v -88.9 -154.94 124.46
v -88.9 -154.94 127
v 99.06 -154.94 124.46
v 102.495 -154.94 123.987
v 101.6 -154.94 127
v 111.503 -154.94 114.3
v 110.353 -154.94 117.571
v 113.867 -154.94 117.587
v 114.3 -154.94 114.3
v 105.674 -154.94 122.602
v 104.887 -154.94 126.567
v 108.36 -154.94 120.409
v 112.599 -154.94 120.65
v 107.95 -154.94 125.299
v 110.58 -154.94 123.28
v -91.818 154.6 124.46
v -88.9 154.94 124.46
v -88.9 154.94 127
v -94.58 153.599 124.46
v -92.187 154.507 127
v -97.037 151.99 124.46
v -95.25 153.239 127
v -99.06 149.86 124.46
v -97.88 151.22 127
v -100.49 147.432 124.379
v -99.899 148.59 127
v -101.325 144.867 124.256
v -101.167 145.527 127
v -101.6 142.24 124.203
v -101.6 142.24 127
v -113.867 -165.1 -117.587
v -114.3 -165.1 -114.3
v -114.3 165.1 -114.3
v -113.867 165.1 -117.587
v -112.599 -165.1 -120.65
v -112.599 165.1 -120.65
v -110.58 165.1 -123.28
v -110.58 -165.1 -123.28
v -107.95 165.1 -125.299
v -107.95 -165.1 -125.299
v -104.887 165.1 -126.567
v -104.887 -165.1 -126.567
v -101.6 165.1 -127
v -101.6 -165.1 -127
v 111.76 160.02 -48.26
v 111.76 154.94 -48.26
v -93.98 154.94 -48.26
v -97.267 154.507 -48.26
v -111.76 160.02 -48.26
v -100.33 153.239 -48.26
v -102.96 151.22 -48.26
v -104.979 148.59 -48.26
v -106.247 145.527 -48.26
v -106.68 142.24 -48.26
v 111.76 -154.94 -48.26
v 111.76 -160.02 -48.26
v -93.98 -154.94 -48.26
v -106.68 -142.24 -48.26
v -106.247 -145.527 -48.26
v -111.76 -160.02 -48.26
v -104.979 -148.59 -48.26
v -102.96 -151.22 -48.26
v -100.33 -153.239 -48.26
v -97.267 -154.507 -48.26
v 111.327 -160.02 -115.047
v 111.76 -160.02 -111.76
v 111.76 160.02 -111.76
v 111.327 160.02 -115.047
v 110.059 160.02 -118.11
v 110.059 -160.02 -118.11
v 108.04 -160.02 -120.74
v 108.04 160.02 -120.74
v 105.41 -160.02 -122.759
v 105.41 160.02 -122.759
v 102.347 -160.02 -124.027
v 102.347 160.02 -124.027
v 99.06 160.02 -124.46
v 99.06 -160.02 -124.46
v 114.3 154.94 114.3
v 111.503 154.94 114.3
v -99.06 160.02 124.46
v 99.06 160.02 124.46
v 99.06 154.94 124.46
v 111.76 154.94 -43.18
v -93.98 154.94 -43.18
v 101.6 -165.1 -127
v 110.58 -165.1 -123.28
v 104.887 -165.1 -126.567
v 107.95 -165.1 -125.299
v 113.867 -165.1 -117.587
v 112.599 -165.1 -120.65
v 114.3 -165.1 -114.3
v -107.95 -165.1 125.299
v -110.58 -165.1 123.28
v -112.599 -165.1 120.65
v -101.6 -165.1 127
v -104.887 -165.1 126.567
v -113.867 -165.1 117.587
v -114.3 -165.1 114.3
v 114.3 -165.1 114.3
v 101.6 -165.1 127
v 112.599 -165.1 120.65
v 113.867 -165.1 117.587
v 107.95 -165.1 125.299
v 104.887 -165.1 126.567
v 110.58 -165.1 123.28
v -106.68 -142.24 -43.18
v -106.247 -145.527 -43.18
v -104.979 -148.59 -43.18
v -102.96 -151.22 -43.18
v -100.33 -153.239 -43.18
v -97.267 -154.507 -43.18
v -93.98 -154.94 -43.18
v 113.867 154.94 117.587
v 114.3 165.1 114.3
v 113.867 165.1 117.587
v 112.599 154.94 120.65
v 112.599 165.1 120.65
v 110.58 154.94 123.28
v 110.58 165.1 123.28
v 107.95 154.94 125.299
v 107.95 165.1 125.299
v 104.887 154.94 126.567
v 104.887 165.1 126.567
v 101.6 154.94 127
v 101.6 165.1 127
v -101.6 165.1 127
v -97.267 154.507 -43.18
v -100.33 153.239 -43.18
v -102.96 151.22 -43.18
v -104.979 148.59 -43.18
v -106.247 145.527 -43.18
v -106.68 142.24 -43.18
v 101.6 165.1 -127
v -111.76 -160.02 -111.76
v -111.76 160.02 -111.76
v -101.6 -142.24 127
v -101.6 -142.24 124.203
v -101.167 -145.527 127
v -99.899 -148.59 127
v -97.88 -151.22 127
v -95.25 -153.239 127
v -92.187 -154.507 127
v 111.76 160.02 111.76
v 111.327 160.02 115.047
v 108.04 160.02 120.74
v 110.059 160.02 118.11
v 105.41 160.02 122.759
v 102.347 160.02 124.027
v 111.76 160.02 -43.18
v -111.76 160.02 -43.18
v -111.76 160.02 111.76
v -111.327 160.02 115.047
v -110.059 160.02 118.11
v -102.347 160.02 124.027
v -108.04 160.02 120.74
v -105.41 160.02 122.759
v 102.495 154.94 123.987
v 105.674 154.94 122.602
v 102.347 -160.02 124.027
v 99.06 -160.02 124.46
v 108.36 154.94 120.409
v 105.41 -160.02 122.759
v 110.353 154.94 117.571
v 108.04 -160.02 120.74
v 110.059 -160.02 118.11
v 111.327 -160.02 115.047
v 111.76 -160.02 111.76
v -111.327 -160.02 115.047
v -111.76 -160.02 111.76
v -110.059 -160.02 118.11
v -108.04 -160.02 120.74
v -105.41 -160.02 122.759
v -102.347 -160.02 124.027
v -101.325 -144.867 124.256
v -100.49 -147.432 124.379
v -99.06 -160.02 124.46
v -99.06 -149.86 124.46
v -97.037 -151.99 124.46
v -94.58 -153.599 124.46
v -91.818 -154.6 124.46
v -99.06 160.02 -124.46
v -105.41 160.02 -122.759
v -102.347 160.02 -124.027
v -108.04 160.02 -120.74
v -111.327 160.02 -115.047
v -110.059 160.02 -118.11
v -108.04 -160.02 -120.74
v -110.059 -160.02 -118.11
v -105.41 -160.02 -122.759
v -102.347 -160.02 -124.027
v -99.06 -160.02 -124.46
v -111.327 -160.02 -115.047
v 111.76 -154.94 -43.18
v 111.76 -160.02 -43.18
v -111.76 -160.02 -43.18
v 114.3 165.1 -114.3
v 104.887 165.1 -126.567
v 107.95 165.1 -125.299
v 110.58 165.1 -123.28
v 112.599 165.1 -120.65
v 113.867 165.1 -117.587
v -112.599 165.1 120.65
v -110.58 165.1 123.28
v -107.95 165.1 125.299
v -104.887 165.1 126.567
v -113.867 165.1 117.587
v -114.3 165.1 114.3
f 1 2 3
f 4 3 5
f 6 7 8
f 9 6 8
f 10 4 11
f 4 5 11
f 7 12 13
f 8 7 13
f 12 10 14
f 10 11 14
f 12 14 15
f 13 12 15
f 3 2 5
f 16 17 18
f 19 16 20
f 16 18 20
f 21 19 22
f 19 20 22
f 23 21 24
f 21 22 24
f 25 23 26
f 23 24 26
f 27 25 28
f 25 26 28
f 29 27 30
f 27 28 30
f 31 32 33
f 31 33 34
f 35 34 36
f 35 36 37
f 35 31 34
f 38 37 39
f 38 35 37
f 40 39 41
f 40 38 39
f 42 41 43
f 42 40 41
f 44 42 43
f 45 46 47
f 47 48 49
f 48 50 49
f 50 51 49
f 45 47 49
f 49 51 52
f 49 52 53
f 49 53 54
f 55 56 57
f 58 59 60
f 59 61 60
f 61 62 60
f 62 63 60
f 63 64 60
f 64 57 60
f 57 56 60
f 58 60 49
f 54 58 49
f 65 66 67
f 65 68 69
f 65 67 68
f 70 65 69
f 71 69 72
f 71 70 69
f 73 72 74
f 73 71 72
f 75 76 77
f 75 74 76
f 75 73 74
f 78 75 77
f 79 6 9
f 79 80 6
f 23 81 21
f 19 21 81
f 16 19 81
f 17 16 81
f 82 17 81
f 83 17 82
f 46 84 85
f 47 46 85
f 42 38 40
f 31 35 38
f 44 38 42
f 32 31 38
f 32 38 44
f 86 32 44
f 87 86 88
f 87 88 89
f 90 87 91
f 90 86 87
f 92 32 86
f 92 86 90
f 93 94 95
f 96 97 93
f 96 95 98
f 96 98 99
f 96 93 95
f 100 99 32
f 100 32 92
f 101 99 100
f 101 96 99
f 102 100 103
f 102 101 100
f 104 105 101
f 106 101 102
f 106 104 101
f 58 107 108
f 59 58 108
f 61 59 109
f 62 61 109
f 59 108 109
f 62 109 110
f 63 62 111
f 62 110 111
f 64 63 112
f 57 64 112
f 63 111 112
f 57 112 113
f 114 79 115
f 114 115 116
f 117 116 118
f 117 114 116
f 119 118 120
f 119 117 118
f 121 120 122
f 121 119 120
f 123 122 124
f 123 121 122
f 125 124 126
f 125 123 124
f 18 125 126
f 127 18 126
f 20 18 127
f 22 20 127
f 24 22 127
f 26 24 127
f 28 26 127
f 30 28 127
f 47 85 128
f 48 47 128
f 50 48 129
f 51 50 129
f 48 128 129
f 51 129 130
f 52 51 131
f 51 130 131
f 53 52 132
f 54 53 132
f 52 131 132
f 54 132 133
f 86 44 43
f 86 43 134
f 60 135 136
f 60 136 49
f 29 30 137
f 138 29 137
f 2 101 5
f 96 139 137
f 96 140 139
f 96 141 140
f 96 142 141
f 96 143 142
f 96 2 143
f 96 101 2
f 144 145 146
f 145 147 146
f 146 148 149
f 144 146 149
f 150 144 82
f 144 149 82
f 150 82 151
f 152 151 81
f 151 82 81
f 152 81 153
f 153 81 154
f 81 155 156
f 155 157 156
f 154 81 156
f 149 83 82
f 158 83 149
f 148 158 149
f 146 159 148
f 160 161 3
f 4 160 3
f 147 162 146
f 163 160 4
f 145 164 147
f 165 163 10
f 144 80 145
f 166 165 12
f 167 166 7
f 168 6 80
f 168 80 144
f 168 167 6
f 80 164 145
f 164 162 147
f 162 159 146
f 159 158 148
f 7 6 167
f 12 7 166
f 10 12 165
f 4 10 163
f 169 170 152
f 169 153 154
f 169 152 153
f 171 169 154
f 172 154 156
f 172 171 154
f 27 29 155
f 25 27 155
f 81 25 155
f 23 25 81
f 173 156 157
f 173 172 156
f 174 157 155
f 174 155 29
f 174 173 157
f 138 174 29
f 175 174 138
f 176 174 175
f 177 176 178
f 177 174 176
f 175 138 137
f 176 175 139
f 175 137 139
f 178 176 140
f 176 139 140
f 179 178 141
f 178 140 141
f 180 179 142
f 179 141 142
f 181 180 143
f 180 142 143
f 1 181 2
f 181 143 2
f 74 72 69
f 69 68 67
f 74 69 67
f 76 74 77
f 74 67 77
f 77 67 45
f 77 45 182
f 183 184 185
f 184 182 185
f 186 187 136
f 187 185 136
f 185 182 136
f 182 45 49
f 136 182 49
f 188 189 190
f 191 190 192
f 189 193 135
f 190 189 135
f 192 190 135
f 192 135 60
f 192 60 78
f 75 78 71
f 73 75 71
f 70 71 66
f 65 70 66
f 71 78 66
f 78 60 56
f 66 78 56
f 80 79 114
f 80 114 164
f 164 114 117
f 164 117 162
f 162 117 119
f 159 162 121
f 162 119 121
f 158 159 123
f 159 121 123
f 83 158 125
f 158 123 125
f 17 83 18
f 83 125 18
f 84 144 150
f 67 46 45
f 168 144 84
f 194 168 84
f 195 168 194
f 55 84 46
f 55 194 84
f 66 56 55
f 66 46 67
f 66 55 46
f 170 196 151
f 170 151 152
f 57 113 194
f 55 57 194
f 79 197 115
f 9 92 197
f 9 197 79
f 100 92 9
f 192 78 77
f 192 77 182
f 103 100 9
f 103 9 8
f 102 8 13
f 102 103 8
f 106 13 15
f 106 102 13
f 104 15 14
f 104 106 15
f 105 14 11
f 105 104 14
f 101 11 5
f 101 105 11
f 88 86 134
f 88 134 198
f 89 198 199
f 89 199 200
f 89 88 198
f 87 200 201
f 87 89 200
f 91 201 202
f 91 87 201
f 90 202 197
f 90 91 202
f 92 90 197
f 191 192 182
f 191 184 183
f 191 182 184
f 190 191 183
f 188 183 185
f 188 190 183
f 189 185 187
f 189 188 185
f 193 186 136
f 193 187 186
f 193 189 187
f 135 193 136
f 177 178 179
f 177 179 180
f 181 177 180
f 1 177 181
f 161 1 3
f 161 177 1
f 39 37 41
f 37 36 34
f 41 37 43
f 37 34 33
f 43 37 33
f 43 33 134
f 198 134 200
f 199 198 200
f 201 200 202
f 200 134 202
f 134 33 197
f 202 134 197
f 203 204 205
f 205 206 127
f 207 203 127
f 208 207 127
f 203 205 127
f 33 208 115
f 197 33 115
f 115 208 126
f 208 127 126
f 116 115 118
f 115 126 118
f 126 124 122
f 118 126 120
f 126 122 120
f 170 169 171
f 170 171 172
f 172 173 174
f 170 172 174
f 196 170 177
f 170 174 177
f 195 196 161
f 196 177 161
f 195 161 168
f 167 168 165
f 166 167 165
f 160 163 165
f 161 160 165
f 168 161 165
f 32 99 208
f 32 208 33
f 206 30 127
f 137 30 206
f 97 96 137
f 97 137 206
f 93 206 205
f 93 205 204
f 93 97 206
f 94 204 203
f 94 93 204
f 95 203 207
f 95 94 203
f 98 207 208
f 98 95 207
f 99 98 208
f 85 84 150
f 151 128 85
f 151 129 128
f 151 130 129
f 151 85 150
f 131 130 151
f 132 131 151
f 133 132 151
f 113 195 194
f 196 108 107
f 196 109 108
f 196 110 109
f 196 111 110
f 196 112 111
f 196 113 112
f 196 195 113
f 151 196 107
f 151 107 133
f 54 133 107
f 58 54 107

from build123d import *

# Parameters (mm, degrees)
F1_DEPTH      = 165.1
F1_DEPTH_BACK = 165.1
F3_DEPTH      = 12.7
F5_DEPTH      = 5.08
F7_DEPTH      = 5.08
F8_W          = 223.52
F8_H          = 5.08
F9_DEPTH      = 320.04
F11_DEPTH     = 25.4


with BuildPart() as f1:
    # F0 (on Front) → F1 (new body, two sides)
    with BuildSketch(Plane.XZ) as f1_sk:
        with BuildLine():
            Line((-101.6, -127), (101.6, -127))
            ThreePointArc((101.6, -127), (110.580256, -123.280256), (114.3, -114.3))
            Line((114.3, -114.3), (114.3, 114.3))
            ThreePointArc((114.3, 114.3), (110.580256, 123.280256), (101.6, 127))
            Line((101.6, 127), (-101.6, 127))
            ThreePointArc((-101.6, 127), (-110.580256, 123.280256), (-114.3, 114.3))
            Line((-114.3, 114.3), (-114.3, -114.3))
            ThreePointArc((-114.3, -114.3), (-110.580256, -123.280256), (-101.6, -127))
        make_face()
        with BuildLine():
            ThreePointArc((111.76, -111.76), (108.040256, -120.740256), (99.06, -124.46))
            Line((99.06, -124.46), (-99.06, -124.46))
            ThreePointArc((-99.06, -124.46), (-108.040256, -120.740256), (-111.76, -111.76))
            Line((-111.76, -111.76), (-111.76, 111.76))
            ThreePointArc((-111.76, 111.76), (-108.040256, 120.740256), (-99.06, 124.46))
            Line((-99.06, 124.46), (99.06, 124.46))
            ThreePointArc((99.06, 124.46), (108.040256, 120.740256), (111.76, 111.76))
            Line((111.76, 111.76), (111.76, -111.76))
        make_face(mode=Mode.SUBTRACT)
    extrude(amount=F1_DEPTH)
    extrude(f1_sk.sketch, amount=-F1_DEPTH_BACK)

    # F2 (on face) → F3 (cut)
    with BuildSketch(Plane.XY.offset(127)):
        with BuildLine():
            Line((-88.9, -154.94), (312.616626, -154.94))
            Line((312.616626, -154.94), (312.616626, 154.94))
            Line((312.616626, 154.94), (-88.9, 154.94))
            ThreePointArc((-88.9, 154.94), (-97.880256, 151.220256), (-101.6, 142.24))
            Line((-101.6, 142.24), (-101.6, -142.24))
            ThreePointArc((-101.6, -142.24), (-97.880256, -151.220256), (-88.9, -154.94))
        make_face()
    extrude(amount=-F3_DEPTH, mode=Mode.SUBTRACT)

    # F4 (on face) → F5 (join)
    with BuildSketch(Plane.XZ.offset(165.1)):
        with BuildLine():
            Line((-101.6, -127), (101.6, -127))
            ThreePointArc((101.6, -127), (110.580256, -123.280256), (114.3, -114.3))
            Line((114.3, -114.3), (114.3, 114.3))
            ThreePointArc((114.3, 114.3), (110.580256, 123.280256), (101.6, 127))
            Line((101.6, 127), (-101.6, 127))
            ThreePointArc((-101.6, 127), (-110.580256, 123.280256), (-114.3, 114.3))
            Line((-114.3, 114.3), (-114.3, -114.3))
            ThreePointArc((-114.3, -114.3), (-110.580256, -123.280256), (-101.6, -127))
        make_face()
    extrude(amount=-F5_DEPTH)

    # F6 (on face) → F7 (join)
    with BuildSketch(Plane(origin=(0, 165.1, 0), x_dir=(-1, 0, 0), z_dir=(0, 1, 0))):
        with BuildLine():
            Line((-101.6, -127), (101.6, -127))
            ThreePointArc((101.6, -127), (110.580256, -123.280256), (114.3, -114.3))
            Line((114.3, -114.3), (114.3, 114.3))
            ThreePointArc((114.3, 114.3), (110.580256, 123.280256), (101.6, 127))
            Line((101.6, 127), (-101.6, 127))
            ThreePointArc((-101.6, 127), (-110.580256, 123.280256), (-114.3, 114.3))
            Line((-114.3, 114.3), (-114.3, -114.3))
            ThreePointArc((-114.3, -114.3), (-110.580256, -123.280256), (-101.6, -127))
        make_face()
    extrude(amount=-F7_DEPTH)

    # F8 (on face) → F9 (join)
    with BuildSketch(Plane(origin=(0, -160.02, 0), x_dir=(-1, 0, 0), z_dir=(0, 1, 0))):
        with Locations((0, -45.72)):
            Rectangle(F8_W, F8_H)
    extrude(amount=F9_DEPTH)

    # F10 (on face) → F11 (cut)
    with BuildSketch(Plane.XY.offset(-43.18)):
        with BuildLine():
            Line((111.76, -154.94), (111.76, 154.94))
            Line((111.76, 154.94), (-93.98, 154.94))
            ThreePointArc((-93.98, 154.94), (-102.960256, 151.220256), (-106.68, 142.24))
            Line((-106.68, 142.24), (-106.68, -142.24))
            ThreePointArc((-106.68, -142.24), (-102.960256, -151.220256), (-93.98, -154.94))
            Line((-93.98, -154.94), (111.76, -154.94))
        make_face()
    extrude(amount=-F11_DEPTH, mode=Mode.SUBTRACT)


solid = f1.part
